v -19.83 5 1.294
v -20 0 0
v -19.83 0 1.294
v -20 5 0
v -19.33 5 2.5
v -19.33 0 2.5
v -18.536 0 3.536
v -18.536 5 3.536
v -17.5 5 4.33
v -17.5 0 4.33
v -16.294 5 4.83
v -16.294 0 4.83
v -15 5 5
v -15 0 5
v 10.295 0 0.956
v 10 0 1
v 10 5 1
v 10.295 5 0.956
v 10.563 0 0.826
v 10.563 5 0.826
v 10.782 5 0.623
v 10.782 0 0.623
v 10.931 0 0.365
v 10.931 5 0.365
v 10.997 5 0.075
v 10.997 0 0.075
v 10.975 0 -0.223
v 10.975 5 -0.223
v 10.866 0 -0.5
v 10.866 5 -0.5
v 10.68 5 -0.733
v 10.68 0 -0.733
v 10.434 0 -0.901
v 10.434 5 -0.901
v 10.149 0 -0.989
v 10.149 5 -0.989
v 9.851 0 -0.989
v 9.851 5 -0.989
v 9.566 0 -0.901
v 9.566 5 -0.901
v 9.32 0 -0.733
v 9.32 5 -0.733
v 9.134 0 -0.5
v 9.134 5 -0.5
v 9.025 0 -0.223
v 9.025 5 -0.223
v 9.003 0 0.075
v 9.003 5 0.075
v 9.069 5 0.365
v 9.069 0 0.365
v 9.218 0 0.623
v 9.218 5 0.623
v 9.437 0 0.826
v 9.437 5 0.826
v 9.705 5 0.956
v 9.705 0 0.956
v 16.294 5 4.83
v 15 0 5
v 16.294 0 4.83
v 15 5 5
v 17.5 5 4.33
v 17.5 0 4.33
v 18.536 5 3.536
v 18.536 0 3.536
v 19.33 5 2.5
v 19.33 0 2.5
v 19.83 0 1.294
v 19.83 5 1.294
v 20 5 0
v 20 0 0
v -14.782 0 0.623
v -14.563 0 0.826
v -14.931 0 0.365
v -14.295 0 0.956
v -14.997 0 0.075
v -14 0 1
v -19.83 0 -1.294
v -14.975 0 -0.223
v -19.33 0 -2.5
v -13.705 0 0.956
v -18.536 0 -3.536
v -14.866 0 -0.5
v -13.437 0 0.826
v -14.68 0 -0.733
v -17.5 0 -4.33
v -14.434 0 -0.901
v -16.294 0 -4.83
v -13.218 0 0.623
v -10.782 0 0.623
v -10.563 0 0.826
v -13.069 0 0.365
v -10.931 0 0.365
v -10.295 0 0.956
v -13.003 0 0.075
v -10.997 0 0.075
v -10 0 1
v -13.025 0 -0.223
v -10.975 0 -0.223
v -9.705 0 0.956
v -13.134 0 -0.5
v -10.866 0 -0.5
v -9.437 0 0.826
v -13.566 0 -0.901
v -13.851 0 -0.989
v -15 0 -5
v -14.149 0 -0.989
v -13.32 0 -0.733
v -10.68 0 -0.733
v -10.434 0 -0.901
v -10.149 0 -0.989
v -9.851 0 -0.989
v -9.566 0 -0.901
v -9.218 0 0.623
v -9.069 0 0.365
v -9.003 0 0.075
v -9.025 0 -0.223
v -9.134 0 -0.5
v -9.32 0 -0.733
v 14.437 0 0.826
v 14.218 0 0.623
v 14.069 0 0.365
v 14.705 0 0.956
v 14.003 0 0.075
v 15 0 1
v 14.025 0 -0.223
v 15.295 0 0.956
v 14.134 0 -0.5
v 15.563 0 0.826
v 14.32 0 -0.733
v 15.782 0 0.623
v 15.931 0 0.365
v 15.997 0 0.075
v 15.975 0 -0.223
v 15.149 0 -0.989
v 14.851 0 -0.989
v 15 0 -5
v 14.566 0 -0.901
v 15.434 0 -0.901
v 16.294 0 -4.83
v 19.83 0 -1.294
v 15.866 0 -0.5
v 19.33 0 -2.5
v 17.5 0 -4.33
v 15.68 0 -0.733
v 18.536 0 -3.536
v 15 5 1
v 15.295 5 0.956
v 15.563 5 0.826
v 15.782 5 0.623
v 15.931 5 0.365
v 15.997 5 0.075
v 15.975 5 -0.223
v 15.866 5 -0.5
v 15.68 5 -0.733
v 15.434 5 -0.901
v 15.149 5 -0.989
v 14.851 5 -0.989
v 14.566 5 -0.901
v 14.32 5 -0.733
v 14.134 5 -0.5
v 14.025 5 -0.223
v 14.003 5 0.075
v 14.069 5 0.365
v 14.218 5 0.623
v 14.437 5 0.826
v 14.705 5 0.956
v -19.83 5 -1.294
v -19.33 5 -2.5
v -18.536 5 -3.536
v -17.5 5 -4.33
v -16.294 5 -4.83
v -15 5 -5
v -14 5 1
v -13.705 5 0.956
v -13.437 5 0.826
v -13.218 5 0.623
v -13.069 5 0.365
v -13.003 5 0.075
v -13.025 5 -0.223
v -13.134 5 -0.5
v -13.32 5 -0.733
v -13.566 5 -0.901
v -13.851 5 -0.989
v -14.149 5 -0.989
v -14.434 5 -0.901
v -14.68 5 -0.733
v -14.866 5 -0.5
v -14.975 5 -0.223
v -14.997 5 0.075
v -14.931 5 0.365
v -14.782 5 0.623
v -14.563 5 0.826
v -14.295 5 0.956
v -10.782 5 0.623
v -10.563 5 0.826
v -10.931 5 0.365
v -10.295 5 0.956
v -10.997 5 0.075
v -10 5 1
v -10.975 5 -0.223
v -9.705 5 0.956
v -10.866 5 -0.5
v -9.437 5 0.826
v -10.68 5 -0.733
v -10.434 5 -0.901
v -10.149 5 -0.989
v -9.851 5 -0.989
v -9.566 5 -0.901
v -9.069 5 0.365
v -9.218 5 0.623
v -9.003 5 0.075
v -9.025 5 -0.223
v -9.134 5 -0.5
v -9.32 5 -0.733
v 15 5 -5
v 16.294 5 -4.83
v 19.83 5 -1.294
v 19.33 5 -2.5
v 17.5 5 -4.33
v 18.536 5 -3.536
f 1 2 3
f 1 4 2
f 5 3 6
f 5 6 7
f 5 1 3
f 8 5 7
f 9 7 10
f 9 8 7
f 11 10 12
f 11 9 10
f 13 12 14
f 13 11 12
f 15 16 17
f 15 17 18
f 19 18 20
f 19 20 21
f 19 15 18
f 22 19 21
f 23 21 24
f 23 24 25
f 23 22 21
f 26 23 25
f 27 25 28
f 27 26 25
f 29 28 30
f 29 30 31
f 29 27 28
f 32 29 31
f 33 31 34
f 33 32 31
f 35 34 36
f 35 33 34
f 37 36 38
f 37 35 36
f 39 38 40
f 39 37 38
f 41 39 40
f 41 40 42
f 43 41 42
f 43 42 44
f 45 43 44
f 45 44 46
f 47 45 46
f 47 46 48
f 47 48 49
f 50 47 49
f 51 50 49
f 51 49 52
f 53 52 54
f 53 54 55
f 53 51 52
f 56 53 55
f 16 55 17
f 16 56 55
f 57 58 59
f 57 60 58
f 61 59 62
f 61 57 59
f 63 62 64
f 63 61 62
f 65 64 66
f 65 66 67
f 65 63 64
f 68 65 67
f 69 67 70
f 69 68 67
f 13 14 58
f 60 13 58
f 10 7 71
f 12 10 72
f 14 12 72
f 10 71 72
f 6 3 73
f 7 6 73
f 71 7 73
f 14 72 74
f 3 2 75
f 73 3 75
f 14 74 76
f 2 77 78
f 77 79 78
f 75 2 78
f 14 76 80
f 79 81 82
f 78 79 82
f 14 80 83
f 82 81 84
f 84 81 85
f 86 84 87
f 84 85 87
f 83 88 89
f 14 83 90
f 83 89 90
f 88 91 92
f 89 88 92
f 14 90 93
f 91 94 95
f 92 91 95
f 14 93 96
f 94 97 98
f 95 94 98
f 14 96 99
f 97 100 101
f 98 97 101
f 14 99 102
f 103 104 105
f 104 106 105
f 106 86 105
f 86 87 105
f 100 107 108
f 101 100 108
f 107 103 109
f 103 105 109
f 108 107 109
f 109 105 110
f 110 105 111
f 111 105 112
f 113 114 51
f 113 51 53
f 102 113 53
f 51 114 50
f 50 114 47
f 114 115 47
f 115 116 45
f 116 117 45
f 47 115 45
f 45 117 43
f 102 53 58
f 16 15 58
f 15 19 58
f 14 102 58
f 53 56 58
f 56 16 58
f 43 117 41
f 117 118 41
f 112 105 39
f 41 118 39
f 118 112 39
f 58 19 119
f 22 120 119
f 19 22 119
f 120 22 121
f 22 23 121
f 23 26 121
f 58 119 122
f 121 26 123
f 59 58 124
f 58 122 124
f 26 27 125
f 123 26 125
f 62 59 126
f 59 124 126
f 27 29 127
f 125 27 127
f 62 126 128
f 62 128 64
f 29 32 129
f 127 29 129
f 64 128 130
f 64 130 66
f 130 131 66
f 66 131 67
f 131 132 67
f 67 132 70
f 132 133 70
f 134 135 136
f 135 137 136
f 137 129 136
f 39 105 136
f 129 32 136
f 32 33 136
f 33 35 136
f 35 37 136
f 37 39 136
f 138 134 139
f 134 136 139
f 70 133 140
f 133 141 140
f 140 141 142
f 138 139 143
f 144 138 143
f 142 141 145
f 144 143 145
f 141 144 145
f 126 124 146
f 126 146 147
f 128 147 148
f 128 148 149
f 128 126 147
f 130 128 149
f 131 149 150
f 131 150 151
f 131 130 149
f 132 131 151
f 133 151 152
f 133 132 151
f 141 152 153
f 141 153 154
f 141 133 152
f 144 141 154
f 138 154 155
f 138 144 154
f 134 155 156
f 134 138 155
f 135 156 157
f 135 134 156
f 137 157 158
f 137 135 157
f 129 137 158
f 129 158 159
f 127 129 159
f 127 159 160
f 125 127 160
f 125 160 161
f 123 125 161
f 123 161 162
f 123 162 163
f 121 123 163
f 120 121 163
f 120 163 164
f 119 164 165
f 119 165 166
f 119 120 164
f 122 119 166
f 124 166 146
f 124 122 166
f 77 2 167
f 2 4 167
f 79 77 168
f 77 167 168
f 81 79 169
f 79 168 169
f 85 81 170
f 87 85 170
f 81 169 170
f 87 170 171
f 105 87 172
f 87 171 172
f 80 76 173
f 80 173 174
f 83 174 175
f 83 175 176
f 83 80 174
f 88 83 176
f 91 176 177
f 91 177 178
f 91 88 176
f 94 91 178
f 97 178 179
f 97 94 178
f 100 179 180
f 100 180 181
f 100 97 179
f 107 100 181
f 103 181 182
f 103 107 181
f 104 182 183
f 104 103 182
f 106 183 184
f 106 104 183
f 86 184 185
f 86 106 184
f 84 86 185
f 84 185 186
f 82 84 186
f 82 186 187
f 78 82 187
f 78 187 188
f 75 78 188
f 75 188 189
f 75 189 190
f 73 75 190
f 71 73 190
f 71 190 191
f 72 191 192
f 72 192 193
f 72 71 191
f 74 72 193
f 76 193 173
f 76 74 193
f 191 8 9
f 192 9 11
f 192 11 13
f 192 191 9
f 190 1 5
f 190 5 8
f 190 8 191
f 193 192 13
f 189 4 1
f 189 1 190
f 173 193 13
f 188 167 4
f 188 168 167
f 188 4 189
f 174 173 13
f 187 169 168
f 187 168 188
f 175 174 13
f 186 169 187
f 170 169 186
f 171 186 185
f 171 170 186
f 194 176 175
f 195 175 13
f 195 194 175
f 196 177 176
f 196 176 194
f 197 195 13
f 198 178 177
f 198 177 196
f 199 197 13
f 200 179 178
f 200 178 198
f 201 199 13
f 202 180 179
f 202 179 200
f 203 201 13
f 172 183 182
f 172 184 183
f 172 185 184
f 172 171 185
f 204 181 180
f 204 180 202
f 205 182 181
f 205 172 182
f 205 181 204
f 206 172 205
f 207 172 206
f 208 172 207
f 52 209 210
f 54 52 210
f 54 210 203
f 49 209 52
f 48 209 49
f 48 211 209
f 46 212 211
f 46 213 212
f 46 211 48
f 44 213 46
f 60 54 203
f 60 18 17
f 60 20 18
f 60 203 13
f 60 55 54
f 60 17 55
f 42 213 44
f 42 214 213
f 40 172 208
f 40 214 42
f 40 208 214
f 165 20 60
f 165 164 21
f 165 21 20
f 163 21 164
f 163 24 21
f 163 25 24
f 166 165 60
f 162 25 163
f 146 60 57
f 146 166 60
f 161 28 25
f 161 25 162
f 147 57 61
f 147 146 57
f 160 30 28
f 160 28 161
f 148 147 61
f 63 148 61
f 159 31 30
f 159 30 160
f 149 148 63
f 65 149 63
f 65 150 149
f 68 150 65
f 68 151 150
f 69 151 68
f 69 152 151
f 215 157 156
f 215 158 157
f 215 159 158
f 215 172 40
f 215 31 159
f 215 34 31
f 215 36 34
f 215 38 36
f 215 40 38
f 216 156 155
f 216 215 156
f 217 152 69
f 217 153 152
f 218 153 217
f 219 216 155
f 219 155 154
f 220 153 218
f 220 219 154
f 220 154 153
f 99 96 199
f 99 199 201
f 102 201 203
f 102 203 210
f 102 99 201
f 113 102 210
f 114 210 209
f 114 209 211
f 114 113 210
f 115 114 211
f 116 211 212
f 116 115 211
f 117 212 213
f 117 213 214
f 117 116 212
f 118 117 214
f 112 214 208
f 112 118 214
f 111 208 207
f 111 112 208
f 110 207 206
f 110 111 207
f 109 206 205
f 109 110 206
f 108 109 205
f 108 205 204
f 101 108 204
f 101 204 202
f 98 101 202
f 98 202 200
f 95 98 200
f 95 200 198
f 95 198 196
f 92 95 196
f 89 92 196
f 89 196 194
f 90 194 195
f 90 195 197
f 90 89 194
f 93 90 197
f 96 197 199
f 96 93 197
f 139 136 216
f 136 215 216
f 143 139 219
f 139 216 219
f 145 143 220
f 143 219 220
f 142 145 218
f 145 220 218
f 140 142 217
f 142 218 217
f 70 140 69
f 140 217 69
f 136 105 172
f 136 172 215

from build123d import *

# Parameters (mm, degrees)
SKETCH1_W           = 40
SKETCH1_H           = 10
BOSS_EXTRUDE1_DEPTH = 5
SKETCH2_R           = 1
CUT_EXTRUDE1_DEPTH  = 5
FILLET1_R           = 5


with BuildPart() as part:
    # Sketch1 → Boss-Extrude1 (new body)
    with BuildSketch(Plane(origin=(0, 0, 0), x_dir=(1, 0, 0), z_dir=(0, 1, 0))):
        Rectangle(SKETCH1_W, SKETCH1_H)
    extrude(amount=BOSS_EXTRUDE1_DEPTH)

    # Sketch2 → Cut-Extrude1 (cut)
    with BuildSketch(Plane(origin=(0, 0, 0), x_dir=(1, 0, 0), z_dir=(0, 1, 0))):
        with Locations(Location((10, 0, 0), (0, 0, 270))):
            Circle(SKETCH2_R)
        with Locations(Location((15, 0, 0), (0, 0, 270))):
            Circle(SKETCH2_R)
        with Locations(Location((-10, 0, 0), (0, 0, 270))):
            Circle(SKETCH2_R)
        with Locations(Location((-14, 0, 0), (0, 0, 270))):
            Circle(SKETCH2_R)
    extrude(amount=CUT_EXTRUDE1_DEPTH, mode=Mode.SUBTRACT)

    # Fillet1
    fillet1_edges = [part.edges().sort_by_distance(p)[0] for p in [
        (20, 2.5, -5),
        (-20, 2.5, -5),
        (20, 2.5, 5),
        (-20, 2.5, 5),
    ]]
    fillet(fillet1_edges, radius=FILLET1_R - 0.0001)  # a hair under: the kernel refuses the full size


solid = part.part
